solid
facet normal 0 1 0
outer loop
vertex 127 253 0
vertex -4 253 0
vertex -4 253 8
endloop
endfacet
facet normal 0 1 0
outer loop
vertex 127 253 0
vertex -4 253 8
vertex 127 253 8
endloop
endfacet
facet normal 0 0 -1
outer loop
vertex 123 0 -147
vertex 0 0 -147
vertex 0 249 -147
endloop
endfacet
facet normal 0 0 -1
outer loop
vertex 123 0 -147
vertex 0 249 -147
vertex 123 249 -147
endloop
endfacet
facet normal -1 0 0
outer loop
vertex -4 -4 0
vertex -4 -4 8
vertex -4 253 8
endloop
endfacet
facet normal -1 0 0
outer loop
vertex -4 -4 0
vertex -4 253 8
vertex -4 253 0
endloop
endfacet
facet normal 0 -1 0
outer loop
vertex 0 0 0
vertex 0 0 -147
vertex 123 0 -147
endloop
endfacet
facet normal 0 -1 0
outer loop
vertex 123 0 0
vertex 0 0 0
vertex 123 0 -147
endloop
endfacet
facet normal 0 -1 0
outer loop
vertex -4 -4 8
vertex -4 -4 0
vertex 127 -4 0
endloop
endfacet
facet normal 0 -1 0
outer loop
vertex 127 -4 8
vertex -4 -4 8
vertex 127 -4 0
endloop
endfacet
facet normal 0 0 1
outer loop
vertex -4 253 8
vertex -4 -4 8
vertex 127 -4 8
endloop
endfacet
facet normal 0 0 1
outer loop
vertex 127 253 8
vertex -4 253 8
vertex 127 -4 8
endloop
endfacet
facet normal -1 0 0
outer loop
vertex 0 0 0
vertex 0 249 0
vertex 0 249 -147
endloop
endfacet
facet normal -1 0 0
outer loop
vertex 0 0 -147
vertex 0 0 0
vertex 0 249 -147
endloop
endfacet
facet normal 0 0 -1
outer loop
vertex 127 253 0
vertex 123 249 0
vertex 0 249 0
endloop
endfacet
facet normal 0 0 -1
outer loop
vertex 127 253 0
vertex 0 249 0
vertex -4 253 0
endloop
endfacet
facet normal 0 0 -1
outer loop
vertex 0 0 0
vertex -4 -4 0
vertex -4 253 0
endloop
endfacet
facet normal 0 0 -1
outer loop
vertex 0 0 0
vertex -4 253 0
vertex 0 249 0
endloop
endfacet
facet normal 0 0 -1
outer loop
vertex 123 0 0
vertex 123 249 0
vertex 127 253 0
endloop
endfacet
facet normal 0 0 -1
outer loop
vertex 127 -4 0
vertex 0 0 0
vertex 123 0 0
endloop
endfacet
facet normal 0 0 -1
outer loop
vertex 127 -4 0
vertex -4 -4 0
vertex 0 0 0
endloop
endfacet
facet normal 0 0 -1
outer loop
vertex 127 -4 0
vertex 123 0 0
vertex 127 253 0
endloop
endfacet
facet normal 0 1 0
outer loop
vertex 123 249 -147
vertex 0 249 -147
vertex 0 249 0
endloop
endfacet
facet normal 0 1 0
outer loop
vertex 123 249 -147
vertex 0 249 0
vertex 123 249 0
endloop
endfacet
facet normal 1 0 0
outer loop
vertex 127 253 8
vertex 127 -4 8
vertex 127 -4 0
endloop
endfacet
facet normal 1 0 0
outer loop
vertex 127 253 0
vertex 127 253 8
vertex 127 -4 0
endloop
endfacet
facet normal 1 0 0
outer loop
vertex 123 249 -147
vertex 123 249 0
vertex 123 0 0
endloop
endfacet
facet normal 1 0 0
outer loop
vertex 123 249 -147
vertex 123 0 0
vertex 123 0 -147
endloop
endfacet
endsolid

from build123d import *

# Parameters (mm, degrees)
SKETCH3_W                = 123
SKETCH3_H                = 147
BOSS_EXTRUDE1_DEPTH      = 249
BOSS_EXTRUDE2_DEPTH      = 253
BOSS_EXTRUDE2_DEPTH_BACK = 4
SKETCH4_W                = 131
SKETCH4_H                = 8


with BuildPart() as part:
    # Sketch3 → Boss-Extrude1 (new body)
    with BuildSketch(Plane(origin=(0, 0, 0), x_dir=(1, 0, 0), z_dir=(0, 1, 0))):
        with Locations((61.5, 73.5)):
            Rectangle(SKETCH3_W, SKETCH3_H)
    extrude(amount=BOSS_EXTRUDE1_DEPTH)

    # Sketch4 → Boss-Extrude2 (add, two sides: drawn at the far end of the back side and taken through both)
    with BuildSketch(Plane(origin=(0, 0, 0), x_dir=(1, 0, 0), z_dir=(0, 1, 0)).offset(-BOSS_EXTRUDE2_DEPTH_BACK)):
        with Locations((61.5, -4)):
            Rectangle(SKETCH4_W, SKETCH4_H)
    extrude(amount=BOSS_EXTRUDE2_DEPTH + BOSS_EXTRUDE2_DEPTH_BACK)


solid = part.part
